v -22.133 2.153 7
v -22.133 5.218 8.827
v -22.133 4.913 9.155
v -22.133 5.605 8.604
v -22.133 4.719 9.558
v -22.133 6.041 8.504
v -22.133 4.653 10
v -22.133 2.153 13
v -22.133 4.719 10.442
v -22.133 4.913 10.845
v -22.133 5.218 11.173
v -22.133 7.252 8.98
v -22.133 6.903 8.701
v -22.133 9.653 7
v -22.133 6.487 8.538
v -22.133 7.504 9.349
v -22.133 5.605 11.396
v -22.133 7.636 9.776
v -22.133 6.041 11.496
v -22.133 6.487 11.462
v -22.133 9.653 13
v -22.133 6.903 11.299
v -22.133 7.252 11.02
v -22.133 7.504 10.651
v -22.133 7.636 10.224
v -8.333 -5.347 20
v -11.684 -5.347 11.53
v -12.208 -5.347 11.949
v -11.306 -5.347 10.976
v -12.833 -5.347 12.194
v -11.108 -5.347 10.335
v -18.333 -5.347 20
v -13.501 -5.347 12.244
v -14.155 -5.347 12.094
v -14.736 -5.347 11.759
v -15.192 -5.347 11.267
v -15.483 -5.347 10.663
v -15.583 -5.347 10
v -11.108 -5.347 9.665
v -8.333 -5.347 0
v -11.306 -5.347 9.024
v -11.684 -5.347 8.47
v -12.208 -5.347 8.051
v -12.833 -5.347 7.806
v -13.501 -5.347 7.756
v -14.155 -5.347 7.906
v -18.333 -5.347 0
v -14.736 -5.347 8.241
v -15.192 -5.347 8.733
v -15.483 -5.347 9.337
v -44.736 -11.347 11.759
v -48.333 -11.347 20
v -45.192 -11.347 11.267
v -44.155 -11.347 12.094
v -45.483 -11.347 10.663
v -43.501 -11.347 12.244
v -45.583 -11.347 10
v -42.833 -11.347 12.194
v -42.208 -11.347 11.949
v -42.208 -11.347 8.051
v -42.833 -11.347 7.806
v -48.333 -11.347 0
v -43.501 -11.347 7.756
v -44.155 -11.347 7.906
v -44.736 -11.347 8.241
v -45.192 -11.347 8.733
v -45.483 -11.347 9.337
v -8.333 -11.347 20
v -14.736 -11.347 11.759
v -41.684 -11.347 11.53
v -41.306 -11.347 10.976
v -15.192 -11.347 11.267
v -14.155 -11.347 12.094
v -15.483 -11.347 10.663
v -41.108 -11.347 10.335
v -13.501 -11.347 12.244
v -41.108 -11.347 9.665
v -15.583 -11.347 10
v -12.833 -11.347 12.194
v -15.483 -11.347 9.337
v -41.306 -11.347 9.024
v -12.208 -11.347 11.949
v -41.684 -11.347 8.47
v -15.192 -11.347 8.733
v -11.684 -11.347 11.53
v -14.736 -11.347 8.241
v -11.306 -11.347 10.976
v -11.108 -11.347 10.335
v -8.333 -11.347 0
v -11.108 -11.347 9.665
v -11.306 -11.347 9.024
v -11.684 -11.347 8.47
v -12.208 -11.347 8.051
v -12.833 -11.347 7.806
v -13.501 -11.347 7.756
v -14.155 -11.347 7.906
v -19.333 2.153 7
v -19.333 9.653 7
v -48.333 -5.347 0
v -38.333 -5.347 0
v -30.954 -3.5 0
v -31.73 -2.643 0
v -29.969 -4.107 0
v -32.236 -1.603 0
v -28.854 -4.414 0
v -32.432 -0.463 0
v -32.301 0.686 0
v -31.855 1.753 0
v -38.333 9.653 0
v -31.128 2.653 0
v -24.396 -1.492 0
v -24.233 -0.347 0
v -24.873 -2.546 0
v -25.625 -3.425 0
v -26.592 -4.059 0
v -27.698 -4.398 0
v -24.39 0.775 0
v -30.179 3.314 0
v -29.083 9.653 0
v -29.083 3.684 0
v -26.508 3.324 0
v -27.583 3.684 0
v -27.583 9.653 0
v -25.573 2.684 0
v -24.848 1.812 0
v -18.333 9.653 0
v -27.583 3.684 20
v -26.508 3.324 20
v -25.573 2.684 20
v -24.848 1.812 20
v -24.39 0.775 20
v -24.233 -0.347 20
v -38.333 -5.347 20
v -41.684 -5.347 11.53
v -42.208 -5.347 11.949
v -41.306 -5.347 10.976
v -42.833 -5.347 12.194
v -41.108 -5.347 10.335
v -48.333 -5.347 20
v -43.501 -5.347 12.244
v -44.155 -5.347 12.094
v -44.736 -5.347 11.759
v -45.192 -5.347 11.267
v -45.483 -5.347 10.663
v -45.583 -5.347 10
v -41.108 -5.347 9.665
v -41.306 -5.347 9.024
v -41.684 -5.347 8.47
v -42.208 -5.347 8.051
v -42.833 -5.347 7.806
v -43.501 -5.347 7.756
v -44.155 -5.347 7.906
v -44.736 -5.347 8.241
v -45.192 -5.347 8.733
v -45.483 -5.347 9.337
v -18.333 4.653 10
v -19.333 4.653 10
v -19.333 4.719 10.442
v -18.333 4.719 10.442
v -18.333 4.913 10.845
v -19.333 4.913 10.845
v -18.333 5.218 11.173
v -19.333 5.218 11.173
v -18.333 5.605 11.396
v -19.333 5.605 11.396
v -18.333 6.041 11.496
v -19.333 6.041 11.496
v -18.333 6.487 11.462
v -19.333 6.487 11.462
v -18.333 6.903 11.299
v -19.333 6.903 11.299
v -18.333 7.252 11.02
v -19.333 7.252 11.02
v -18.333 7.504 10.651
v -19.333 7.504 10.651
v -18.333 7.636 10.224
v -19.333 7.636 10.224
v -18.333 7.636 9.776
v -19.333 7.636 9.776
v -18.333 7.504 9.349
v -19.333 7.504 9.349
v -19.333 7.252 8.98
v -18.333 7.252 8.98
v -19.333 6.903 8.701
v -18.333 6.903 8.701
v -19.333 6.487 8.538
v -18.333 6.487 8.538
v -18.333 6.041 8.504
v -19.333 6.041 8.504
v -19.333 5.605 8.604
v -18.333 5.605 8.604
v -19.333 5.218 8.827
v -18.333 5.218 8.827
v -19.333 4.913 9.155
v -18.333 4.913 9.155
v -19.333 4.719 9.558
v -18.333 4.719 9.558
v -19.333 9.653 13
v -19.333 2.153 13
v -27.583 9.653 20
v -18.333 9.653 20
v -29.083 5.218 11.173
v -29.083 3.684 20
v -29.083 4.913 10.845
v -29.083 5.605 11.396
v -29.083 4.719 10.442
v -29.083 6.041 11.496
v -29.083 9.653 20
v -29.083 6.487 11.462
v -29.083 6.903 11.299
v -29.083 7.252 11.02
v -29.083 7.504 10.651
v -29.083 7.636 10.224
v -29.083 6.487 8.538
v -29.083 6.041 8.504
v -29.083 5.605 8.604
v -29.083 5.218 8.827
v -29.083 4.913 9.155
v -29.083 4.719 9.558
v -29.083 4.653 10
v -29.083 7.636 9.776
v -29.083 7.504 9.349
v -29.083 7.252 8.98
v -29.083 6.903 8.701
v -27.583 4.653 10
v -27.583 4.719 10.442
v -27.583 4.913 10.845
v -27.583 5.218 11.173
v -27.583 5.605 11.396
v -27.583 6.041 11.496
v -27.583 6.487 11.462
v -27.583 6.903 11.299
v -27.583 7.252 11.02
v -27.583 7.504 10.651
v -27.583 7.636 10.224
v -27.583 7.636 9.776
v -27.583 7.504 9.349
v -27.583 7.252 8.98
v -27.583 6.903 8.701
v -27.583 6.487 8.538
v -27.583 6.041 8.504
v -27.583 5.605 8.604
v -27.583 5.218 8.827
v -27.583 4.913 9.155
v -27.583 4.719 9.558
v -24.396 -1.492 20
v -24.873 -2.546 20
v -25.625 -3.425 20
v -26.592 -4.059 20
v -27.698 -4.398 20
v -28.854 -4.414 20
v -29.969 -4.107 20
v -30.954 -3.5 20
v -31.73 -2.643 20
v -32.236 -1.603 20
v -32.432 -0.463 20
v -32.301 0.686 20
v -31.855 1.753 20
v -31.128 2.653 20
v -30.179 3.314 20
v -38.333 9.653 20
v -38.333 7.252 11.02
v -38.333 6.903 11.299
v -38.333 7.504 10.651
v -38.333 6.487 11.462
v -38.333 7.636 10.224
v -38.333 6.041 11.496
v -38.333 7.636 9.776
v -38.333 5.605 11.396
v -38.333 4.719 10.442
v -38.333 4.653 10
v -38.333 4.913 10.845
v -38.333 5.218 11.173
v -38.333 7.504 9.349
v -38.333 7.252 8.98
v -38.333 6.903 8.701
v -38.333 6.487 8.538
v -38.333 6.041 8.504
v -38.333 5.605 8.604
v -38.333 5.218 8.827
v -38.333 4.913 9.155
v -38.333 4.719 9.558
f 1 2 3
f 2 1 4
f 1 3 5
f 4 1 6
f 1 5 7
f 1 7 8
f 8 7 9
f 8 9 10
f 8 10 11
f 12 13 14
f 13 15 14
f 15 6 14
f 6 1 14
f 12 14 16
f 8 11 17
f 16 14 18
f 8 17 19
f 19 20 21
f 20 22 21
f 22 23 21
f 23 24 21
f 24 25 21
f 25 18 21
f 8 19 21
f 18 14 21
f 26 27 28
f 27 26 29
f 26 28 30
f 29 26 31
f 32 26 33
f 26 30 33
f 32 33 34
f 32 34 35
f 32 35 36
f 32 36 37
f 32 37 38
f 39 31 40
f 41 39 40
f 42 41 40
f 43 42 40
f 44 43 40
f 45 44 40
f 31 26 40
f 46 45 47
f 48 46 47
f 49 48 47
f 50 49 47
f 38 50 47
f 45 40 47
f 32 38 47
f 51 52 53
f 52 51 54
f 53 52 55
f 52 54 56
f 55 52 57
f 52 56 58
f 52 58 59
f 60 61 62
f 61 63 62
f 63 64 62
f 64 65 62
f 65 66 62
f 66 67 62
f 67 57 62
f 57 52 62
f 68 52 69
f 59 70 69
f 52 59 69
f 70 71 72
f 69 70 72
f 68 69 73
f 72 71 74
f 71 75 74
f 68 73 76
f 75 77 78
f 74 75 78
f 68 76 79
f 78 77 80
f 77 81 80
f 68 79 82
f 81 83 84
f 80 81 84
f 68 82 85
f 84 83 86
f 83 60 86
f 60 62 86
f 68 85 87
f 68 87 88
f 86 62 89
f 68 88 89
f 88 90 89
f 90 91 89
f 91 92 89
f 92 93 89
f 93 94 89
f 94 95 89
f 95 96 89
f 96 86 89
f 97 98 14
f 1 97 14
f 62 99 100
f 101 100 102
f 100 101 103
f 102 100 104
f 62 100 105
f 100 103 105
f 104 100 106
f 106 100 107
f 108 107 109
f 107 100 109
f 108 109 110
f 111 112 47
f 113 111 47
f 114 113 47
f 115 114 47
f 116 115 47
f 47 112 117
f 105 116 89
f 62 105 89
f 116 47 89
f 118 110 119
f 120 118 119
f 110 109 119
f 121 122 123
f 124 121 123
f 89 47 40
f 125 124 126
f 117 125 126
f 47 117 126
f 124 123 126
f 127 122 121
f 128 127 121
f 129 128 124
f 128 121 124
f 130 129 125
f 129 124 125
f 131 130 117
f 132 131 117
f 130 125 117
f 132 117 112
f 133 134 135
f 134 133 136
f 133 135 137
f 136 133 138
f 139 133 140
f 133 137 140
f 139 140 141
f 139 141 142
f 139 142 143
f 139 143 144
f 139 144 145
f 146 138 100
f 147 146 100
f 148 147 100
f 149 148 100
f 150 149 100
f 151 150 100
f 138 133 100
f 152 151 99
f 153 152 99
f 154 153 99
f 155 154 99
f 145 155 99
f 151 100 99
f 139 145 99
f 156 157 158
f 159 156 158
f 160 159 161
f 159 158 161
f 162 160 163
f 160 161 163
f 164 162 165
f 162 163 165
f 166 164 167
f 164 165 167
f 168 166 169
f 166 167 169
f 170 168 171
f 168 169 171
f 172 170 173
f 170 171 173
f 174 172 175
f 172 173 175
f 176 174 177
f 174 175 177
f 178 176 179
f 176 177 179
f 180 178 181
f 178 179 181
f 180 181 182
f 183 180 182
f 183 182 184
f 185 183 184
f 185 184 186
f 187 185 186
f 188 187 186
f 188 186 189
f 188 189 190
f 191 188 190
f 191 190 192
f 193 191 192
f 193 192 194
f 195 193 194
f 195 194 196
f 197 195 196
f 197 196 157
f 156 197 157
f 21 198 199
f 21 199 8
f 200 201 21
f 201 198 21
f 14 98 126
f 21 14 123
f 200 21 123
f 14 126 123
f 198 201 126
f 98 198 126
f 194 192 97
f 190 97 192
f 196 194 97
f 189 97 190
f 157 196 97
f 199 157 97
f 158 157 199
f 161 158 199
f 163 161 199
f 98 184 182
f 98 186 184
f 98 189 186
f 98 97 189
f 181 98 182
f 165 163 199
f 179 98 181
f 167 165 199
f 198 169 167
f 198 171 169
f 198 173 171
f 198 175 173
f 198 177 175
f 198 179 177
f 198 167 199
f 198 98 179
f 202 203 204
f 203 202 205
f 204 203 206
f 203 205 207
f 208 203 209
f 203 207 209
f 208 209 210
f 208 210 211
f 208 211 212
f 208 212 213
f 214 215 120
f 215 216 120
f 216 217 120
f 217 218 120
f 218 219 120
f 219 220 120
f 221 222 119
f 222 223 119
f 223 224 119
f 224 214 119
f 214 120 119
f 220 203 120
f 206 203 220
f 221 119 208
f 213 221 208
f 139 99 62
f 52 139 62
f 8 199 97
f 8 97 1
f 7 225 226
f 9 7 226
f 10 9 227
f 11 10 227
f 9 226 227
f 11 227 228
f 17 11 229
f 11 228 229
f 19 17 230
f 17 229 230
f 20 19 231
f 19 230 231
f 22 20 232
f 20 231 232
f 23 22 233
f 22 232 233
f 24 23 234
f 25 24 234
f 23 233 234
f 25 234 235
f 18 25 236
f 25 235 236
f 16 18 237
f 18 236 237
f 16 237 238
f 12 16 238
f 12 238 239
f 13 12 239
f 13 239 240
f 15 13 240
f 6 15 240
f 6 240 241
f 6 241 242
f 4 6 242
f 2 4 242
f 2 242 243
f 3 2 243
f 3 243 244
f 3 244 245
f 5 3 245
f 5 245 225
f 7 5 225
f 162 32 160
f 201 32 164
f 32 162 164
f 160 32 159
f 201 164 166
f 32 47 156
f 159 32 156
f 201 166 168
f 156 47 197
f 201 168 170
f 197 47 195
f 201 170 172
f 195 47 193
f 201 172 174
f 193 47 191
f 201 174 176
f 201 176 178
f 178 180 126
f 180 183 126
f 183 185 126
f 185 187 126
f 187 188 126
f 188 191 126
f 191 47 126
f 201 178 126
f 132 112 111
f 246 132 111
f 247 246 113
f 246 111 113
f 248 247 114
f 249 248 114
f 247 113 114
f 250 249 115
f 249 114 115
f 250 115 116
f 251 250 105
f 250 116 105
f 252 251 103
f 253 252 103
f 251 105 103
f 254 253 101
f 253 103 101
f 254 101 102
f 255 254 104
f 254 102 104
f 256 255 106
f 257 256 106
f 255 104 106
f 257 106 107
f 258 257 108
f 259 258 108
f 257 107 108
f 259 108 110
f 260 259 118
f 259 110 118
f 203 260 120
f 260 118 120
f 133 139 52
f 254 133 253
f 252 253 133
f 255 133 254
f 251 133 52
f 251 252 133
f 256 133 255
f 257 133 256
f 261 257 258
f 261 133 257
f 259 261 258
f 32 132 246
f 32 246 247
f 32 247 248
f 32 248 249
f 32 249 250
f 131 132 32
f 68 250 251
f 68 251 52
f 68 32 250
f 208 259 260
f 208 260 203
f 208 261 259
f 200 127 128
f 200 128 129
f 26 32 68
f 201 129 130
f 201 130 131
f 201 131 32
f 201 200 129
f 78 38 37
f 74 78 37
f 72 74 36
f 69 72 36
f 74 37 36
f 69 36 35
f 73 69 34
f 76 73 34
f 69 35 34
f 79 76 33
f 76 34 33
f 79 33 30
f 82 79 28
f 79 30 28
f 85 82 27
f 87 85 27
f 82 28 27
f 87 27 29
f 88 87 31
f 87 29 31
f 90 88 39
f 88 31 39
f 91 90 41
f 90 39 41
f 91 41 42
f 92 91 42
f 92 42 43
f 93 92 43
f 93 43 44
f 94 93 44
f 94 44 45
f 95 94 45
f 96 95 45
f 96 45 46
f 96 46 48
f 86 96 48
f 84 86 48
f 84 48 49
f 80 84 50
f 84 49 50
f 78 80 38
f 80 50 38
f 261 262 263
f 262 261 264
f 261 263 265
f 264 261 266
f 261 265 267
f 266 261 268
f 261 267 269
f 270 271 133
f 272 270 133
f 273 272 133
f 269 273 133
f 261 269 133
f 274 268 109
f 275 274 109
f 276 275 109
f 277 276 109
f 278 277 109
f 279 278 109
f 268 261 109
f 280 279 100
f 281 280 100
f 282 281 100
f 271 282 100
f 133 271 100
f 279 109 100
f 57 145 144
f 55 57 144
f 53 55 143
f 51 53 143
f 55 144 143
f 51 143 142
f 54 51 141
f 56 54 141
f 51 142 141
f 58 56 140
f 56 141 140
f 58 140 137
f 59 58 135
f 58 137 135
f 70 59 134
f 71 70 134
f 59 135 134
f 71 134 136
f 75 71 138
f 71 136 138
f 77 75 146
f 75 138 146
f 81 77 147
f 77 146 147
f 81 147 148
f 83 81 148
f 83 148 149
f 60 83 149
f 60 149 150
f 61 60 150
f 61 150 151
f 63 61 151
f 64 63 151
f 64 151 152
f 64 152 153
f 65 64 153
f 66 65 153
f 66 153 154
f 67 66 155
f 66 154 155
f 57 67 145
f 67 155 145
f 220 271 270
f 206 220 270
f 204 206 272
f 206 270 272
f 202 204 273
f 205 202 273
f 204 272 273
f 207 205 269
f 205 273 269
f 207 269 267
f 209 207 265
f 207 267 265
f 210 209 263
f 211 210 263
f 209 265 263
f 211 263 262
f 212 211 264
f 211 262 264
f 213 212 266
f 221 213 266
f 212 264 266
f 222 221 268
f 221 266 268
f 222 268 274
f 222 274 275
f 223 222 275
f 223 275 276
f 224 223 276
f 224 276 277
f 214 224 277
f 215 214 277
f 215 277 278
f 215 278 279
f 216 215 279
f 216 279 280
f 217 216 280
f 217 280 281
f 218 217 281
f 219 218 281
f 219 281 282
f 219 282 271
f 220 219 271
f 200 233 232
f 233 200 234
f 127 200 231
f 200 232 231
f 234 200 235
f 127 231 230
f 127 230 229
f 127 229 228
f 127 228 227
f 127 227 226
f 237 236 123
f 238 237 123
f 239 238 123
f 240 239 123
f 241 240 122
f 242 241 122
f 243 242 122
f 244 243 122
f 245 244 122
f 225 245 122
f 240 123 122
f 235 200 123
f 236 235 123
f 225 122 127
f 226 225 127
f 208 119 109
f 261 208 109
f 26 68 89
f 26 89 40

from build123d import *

# Parameters (mm, degrees)
F1_DEPTH = 20
F2_R     = 1.5
F3_DEPTH = 20
F4_W     = 2.8
F4_H     = 6
F5_DEPTH = 7.5
F6_R     = 2.25
F7_DEPTH = 6


with BuildPart() as f1:
    # F0 (on Top) → F1 (new body)
    with BuildSketch(Plane.XY):
        with BuildLine():
            Line((-38.333333, 9.652778), (-38.333333, -5.347222))
            Line((-38.333333, -5.347222), (-18.333333, -5.347222))
            Line((-18.333333, -5.347222), (-18.333333, 9.652778))
            Line((-18.333333, 9.652778), (-27.583333, 9.652778))
            Line((-27.583333, 9.652778), (-27.583333, 3.683597))
            ThreePointArc((-27.583333, 3.683597), (-25.18016, 2.273369), (-24.233333, -0.347222))
            ThreePointArc((-24.233333, -0.347222), (-30.953925, -3.500395), (-29.083333, 3.683597))
            Line((-29.083333, 3.683597), (-29.083333, 9.652778))
            Line((-29.083333, 9.652778), (-38.333333, 9.652778))
        make_face()
        Polygon((-48.333333, -5.347222), (-48.333333, -11.347222), (-8.333333, -11.347222), (-8.333333, -5.347222), (-18.333333, -5.347222), (-38.333333, -5.347222), align=None)
    extrude(amount=F1_DEPTH)

    # F2 (on face) → F3 (cut)
    with BuildSketch(Plane(origin=(-38.333333, 0, 0), x_dir=(0, -1, 0), z_dir=(-1, 0, 0))):
        with Locations((-6.152778, 10)):
            Circle(F2_R)
    extrude(amount=-F3_DEPTH, mode=Mode.SUBTRACT)

    # F4 (on face) → F5 (cut)
    with BuildSketch(Plane(origin=(0, 9.652778, 0), x_dir=(-1, 0, 0), z_dir=(0, 1, 0))):
        with Locations((20.733333, 10)):
            Rectangle(F4_W, F4_H)
    extrude(amount=-F5_DEPTH, mode=Mode.SUBTRACT)

    # F6 (on face) → F7 (cut)
    with BuildSketch(Plane(origin=(0, -5.347222, 0), x_dir=(-1, 0, 0), z_dir=(0, 1, 0))):
        with Locations((43.333333, 10)):
            Circle(F6_R)
        with Locations((13.333333, 10)):
            Circle(F6_R)
    extrude(amount=-F7_DEPTH, mode=Mode.SUBTRACT)


solid = f1.part
